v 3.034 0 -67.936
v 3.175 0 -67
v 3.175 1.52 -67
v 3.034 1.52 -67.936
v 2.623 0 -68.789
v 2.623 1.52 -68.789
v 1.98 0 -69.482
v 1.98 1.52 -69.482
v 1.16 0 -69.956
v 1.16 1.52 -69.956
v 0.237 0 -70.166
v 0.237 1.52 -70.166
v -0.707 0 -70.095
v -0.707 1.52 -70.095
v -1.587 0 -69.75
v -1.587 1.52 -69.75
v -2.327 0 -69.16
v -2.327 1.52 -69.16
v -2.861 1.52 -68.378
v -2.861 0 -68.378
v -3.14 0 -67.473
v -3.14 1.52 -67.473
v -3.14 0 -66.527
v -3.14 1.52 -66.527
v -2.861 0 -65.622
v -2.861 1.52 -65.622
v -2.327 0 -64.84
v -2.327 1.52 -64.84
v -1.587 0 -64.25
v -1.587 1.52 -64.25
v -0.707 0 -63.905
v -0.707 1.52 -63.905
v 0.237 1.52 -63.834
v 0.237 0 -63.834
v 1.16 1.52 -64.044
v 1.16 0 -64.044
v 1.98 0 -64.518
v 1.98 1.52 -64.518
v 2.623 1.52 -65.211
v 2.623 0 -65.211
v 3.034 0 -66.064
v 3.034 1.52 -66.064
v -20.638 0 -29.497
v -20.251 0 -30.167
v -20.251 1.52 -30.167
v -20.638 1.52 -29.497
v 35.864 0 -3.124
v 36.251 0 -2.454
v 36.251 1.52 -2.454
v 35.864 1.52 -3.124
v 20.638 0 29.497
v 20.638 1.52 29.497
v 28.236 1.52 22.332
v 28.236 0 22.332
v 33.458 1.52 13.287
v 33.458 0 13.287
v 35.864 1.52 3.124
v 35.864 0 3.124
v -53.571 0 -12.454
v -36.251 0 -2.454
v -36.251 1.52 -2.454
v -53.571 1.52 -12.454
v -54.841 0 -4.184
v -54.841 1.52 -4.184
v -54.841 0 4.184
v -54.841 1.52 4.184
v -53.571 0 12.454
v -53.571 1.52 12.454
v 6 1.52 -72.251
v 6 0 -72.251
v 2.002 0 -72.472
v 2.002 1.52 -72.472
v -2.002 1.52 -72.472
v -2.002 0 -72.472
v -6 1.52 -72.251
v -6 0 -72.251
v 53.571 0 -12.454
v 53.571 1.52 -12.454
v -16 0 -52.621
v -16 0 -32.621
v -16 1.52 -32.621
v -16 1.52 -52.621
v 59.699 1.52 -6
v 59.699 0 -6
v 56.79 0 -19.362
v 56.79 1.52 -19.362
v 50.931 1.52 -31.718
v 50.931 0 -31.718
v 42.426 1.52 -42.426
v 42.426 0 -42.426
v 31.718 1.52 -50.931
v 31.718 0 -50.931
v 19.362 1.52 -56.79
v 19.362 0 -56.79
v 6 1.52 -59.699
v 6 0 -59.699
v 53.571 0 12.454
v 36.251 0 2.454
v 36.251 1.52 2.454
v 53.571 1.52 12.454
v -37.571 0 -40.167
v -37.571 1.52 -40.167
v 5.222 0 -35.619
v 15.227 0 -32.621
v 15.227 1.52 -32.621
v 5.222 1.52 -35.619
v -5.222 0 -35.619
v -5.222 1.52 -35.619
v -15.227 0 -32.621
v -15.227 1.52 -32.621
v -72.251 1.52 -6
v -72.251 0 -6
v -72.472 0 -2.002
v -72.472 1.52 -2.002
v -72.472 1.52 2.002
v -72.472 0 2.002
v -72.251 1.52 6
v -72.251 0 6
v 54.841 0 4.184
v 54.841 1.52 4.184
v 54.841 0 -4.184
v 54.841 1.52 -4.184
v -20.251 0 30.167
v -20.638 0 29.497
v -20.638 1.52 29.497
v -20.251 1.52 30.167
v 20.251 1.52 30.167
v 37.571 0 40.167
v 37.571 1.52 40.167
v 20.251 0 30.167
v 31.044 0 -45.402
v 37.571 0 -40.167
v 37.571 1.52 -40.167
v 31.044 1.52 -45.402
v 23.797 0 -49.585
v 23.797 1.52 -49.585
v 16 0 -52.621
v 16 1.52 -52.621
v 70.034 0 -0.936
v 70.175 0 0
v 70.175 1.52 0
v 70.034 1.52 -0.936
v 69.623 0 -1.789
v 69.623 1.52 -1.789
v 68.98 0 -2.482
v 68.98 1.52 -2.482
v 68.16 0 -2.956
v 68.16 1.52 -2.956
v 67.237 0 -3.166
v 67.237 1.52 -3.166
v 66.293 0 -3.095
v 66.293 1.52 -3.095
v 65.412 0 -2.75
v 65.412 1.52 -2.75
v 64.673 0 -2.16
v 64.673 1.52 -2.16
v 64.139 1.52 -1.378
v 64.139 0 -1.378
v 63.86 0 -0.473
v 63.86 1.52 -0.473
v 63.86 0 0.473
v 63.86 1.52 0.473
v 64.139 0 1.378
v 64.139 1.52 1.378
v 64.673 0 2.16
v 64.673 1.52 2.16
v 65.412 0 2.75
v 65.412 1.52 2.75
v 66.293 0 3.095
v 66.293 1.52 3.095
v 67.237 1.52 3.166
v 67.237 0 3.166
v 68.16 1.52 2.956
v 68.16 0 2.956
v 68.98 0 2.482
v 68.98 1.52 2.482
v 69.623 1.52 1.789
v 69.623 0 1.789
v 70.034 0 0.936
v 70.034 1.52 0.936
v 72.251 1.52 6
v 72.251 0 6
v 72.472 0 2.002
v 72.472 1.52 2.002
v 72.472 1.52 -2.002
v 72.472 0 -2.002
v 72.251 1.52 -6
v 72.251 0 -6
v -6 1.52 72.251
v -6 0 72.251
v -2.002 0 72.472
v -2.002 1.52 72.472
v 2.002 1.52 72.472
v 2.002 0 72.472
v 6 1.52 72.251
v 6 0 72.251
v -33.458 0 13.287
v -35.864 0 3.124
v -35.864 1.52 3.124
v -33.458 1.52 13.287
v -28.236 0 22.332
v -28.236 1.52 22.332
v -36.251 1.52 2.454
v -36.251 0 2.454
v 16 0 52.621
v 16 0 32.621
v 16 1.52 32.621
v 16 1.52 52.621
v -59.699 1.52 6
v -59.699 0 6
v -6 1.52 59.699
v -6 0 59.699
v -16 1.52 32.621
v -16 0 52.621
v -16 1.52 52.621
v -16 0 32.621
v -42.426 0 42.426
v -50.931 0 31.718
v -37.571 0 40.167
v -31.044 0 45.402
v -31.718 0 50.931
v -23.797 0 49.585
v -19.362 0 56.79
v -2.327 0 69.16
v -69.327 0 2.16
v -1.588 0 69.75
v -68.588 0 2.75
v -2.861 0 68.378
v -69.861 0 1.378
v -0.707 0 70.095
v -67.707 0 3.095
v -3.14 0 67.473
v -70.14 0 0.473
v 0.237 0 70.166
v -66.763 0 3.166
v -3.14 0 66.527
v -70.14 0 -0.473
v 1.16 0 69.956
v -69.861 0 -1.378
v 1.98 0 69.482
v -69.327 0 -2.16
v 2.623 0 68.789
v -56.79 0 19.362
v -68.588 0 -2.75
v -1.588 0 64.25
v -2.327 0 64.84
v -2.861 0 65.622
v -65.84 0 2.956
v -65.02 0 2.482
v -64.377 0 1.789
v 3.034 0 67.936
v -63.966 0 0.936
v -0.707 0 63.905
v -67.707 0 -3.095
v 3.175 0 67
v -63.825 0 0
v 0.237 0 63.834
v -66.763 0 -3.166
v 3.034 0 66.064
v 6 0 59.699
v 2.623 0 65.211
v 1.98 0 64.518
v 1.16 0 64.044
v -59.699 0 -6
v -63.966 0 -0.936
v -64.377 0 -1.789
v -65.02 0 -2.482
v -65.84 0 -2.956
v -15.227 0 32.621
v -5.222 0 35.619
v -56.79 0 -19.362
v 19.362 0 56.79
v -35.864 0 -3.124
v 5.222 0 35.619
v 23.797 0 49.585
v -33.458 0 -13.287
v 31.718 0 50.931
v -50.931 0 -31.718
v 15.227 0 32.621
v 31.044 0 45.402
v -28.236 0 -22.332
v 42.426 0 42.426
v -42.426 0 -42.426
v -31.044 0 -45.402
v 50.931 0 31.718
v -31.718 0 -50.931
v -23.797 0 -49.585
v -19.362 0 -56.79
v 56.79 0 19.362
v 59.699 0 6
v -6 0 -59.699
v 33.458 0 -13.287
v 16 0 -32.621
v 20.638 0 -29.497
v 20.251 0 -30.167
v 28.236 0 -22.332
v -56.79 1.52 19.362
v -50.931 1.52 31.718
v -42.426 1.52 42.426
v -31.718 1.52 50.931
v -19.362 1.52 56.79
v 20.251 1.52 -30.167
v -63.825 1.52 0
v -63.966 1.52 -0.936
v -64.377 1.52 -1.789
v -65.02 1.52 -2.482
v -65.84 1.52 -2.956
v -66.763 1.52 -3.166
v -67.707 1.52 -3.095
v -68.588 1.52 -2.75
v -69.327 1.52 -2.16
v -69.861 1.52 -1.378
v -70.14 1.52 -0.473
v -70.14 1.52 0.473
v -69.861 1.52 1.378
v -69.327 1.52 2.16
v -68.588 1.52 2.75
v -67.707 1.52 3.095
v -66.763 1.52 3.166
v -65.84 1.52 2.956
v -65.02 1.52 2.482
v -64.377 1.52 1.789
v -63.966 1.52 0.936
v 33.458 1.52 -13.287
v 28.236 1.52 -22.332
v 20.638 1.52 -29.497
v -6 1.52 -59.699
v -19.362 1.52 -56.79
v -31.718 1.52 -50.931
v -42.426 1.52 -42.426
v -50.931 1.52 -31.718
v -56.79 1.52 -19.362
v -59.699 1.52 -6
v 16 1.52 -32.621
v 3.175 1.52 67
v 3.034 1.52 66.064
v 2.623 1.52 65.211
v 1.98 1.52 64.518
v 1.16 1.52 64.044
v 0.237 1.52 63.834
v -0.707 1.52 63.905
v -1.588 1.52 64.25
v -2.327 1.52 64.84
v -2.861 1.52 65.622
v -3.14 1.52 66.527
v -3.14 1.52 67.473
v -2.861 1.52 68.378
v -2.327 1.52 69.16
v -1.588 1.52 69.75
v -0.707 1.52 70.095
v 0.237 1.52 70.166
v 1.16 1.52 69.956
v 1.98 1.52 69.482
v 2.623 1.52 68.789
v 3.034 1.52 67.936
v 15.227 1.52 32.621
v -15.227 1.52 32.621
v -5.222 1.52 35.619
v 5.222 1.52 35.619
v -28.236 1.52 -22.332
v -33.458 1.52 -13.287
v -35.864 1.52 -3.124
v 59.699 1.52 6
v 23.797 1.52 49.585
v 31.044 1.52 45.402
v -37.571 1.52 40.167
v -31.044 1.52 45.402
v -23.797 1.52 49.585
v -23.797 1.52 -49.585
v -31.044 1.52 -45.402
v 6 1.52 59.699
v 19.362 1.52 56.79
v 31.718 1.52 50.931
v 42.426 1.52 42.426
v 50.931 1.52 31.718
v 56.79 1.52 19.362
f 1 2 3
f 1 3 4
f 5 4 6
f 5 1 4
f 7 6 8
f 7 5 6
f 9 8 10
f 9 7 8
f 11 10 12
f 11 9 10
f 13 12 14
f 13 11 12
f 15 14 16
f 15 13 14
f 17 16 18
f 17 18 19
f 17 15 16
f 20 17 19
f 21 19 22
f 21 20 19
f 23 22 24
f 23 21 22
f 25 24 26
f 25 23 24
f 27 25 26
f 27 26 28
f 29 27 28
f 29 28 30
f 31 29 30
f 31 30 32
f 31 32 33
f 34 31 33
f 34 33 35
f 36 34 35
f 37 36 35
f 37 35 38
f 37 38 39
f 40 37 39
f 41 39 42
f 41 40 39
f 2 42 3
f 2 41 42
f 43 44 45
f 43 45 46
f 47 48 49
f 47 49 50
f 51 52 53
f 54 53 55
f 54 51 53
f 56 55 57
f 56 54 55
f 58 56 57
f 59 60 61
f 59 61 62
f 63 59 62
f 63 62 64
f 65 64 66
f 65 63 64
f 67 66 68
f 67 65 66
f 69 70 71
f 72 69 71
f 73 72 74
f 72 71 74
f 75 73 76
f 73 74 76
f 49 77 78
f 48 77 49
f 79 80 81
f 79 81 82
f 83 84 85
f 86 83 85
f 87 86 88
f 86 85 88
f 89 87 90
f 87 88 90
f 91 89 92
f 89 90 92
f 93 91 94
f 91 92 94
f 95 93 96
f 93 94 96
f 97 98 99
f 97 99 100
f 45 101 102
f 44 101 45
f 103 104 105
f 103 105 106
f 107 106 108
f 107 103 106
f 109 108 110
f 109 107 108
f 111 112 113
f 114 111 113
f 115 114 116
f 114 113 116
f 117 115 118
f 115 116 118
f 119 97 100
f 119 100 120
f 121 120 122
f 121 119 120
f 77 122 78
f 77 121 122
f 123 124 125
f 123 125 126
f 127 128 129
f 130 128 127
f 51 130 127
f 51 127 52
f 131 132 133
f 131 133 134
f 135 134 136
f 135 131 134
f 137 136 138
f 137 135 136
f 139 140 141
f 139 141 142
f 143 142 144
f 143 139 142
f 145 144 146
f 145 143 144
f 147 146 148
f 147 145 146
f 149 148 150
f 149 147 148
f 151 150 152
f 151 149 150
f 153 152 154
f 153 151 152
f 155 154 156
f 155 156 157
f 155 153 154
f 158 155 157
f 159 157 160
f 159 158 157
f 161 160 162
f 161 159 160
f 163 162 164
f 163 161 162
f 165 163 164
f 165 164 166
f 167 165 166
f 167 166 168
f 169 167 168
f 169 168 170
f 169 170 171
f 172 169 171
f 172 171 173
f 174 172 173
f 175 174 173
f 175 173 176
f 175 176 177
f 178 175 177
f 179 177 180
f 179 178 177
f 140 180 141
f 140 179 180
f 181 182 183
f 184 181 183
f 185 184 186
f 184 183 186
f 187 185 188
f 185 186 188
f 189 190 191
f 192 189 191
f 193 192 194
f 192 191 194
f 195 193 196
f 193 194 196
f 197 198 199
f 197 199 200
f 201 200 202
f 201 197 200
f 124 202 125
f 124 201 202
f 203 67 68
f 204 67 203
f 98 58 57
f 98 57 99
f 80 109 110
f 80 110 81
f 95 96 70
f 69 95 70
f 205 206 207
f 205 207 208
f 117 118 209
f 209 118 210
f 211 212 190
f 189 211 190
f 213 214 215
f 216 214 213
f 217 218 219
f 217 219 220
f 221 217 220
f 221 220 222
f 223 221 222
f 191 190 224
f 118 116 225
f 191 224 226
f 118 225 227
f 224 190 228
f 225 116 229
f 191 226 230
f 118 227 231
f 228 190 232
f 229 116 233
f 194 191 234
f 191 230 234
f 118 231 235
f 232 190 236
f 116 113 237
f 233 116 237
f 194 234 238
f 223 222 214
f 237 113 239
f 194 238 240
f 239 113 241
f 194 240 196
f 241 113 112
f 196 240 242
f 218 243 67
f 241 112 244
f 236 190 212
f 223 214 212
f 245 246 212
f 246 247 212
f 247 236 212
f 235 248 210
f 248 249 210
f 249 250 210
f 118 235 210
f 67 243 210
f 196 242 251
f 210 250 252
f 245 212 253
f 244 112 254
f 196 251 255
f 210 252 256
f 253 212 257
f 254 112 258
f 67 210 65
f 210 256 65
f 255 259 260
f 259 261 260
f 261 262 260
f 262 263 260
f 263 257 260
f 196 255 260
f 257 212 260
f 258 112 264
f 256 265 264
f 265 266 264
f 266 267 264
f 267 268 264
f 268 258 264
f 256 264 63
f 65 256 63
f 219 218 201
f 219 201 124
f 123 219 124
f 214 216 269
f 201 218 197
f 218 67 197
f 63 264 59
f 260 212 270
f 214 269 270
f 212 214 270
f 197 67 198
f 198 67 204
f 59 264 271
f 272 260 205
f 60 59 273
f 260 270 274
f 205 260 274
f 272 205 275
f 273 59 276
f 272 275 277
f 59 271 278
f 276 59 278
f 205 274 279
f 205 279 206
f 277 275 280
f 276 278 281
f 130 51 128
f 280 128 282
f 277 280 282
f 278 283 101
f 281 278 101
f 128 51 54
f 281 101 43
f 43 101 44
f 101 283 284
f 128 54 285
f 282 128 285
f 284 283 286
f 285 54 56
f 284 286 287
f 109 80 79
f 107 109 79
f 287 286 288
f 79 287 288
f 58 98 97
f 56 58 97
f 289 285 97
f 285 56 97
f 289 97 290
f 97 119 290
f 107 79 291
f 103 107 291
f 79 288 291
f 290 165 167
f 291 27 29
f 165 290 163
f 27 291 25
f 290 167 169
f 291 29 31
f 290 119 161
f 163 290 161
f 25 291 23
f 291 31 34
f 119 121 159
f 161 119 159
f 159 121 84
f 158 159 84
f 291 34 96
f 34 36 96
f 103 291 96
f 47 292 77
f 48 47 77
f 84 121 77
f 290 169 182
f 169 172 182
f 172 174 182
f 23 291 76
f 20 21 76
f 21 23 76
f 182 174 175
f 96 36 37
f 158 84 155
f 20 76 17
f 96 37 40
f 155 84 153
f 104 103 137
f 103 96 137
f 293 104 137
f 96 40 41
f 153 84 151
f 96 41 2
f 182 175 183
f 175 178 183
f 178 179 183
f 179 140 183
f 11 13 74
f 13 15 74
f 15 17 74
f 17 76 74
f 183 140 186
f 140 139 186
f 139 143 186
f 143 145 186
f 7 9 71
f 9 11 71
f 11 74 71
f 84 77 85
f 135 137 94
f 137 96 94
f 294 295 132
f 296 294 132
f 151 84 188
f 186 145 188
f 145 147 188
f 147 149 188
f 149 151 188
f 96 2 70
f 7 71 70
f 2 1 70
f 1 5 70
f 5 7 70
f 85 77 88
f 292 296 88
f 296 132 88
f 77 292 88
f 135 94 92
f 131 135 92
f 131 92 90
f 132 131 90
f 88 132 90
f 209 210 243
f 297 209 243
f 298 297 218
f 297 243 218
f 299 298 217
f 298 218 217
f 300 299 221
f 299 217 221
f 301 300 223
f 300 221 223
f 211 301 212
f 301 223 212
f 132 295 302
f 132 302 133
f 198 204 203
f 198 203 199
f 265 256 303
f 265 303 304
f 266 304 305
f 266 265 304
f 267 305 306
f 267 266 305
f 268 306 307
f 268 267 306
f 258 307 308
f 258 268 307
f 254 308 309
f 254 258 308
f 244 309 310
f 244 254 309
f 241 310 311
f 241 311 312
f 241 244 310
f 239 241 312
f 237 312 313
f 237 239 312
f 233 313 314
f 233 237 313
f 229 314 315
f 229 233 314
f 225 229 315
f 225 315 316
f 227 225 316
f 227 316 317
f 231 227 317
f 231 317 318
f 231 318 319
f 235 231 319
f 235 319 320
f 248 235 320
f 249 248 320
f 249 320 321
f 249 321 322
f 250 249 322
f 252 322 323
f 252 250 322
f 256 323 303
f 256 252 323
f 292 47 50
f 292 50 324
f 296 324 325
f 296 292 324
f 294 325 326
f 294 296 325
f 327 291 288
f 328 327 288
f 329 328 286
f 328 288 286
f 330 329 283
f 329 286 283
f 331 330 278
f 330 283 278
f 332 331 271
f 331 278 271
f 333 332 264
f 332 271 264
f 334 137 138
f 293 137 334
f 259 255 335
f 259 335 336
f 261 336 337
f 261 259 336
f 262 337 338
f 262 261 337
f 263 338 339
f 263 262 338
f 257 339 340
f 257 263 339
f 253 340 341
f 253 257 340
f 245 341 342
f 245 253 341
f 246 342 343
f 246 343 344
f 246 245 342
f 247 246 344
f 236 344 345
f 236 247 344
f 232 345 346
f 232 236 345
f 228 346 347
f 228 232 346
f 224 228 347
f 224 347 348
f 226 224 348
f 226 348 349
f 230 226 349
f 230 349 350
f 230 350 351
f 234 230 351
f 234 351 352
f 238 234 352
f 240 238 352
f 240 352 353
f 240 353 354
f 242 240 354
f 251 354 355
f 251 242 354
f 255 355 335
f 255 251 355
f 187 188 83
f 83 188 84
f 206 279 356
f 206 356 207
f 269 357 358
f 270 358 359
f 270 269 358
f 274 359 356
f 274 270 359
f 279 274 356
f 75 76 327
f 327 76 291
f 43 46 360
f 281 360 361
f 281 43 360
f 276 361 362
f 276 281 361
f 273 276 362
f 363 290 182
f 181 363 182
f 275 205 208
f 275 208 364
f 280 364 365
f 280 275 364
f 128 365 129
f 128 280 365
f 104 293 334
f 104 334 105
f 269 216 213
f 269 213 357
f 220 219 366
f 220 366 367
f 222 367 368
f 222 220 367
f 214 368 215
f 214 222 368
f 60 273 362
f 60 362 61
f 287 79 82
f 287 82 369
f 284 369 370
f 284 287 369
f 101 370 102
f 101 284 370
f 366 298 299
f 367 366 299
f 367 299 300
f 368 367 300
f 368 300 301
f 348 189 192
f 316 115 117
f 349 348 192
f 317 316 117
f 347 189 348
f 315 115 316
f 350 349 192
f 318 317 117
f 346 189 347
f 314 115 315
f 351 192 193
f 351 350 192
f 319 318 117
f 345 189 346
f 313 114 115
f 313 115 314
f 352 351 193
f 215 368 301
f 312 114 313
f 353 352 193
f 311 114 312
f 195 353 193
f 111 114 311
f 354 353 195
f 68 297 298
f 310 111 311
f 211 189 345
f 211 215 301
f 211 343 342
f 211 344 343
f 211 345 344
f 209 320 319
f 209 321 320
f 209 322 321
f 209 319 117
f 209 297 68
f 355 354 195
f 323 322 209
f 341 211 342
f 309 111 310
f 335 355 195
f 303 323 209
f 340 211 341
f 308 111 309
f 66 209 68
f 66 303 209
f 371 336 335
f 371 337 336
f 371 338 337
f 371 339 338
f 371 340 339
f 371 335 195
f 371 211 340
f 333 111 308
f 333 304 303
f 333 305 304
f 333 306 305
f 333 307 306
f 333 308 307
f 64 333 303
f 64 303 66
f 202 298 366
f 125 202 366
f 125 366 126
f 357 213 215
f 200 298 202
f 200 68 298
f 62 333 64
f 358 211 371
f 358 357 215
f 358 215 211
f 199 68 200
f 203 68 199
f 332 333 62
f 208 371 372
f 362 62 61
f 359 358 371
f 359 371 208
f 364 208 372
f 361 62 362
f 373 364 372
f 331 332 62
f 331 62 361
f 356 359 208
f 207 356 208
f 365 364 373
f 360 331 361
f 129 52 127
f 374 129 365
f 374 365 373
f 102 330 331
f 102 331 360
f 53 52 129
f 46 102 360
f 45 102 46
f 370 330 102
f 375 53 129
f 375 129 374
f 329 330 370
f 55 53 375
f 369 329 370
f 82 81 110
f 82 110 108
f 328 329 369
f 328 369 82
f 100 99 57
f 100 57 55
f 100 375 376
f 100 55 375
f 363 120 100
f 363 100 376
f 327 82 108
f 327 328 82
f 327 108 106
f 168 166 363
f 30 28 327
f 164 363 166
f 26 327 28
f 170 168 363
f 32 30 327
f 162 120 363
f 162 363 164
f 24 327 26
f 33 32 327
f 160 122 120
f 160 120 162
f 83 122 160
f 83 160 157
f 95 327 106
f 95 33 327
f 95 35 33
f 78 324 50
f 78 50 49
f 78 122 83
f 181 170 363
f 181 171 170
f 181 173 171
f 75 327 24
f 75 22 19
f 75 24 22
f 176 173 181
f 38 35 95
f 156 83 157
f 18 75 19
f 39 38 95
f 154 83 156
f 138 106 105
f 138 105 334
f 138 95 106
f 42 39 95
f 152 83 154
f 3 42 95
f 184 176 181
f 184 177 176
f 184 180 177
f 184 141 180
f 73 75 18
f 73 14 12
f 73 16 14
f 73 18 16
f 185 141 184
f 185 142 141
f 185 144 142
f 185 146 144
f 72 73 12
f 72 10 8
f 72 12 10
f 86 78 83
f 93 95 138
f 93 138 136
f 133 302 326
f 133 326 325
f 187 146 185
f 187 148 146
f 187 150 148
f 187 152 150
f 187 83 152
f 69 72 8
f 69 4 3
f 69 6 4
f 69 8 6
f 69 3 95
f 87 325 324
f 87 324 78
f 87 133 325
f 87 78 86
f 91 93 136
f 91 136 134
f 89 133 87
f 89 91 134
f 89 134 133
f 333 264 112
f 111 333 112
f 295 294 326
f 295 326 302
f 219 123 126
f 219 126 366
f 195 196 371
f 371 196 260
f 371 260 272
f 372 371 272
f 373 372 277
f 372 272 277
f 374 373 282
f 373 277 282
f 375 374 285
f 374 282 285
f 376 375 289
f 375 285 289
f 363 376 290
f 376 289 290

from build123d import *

# Parameters (mm, degrees)
SKETCH1_R           = 3.175
BOSS_EXTRUDE5_DEPTH = 1.52
SKETCH3_R           = 36
CUT_EXTRUDE4_DEPTH  = 2.52


with BuildPart() as part:
    # Sketch1 → Boss-Extrude5 (new body)
    with BuildSketch(Plane(origin=(0, 0, 0), x_dir=(1, 0, 0), z_dir=(0, 1, 0))):
        with BuildLine():
            Line((-5.999999832, 72.25129758), (-5.999999832, 59.699246243))
            ThreePointArc((-5.999999832, 59.699246243), (-42.426406812, 42.426406931), (-59.699246226, 6))
            Line((-59.699246226, 6), (-72.251297552, 6.000000168))
            ThreePointArc((-72.251297552, 6.000000168), (-72.5, 1.68e-07), (-72.25129758, -5.999999832))
            Line((-72.25129758, -5.999999832), (-59.699246243, -5.999999832))
            ThreePointArc((-59.699246243, -5.999999832), (-42.426406931, -42.426406812), (-6, -59.699246226))
            Line((-6, -59.699246226), (-6.000000168, -72.251297552))
            ThreePointArc((-6.000000168, -72.251297552), (-1.68e-07, -72.5), (5.999999832, -72.25129758))
            Line((5.999999832, -72.25129758), (5.999999832, -59.699246243))
            ThreePointArc((5.999999832, -59.699246243), (42.426406812, -42.426406931), (59.699246226, -6))
            Line((59.699246226, -6), (72.251297552, -6.000000168))
            ThreePointArc((72.251297552, -6.000000168), (72.5, -1.68e-07), (72.25129758, 5.999999832))
            Line((72.25129758, 5.999999832), (59.699246243, 5.999999832))
            ThreePointArc((59.699246243, 5.999999832), (42.426406931, 42.426406812), (6, 59.699246226))
            Line((6, 59.699246226), (6.000000168, 72.251297552))
            ThreePointArc((6.000000168, 72.251297552), (1.68e-07, 72.5), (-5.999999832, 72.25129758))
        make_face()
        with Locations((9.7e-08, 67)):
            Circle(SKETCH1_R, mode=Mode.SUBTRACT)
        with Locations((67, -9.7e-08)):
            Circle(SKETCH1_R, mode=Mode.SUBTRACT)
        with Locations((-9.7e-08, -67)):
            Circle(SKETCH1_R, mode=Mode.SUBTRACT)
        with Locations((-67, 9.7e-08)):
            Circle(SKETCH1_R, mode=Mode.SUBTRACT)
        with BuildLine():
            Line((20.250864517, 30.167050694), (37.571372593, 40.167050694))
            ThreePointArc((37.571372593, 40.167050694), (27.5, 47.631397208), (16, 52.621288468))
            Line((16, 52.621288468), (16, 32.621288468))
            Line((16, 32.621288468), (-16, 32.621288468))
            Line((-16, 32.621288468), (-16, 52.621288468))
            ThreePointArc((-16, 52.621288468), (-27.5, 47.631397208), (-37.571372593, 40.167050694))
            Line((-37.571372593, 40.167050694), (-20.250864517, 30.167050694))
            Line((-20.250864517, 30.167050694), (-36.250864517, 2.454237773))
            Line((-36.250864517, 2.454237773), (-53.571372593, 12.454237773))
            ThreePointArc((-53.571372593, 12.454237773), (-55, 0), (-53.571372593, -12.454237773))
            Line((-53.571372593, -12.454237773), (-36.250864517, -2.454237773))
            Line((-36.250864517, -2.454237773), (-20.250864517, -30.167050694))
            Line((-20.250864517, -30.167050694), (-37.571372593, -40.167050694))
            ThreePointArc((-37.571372593, -40.167050694), (-27.5, -47.631397208), (-16, -52.621288468))
            Line((-16, -52.621288468), (-16, -32.621288468))
            Line((-16, -32.621288468), (16, -32.621288468))
            Line((16, -32.621288468), (16, -52.621288468))
            ThreePointArc((16, -52.621288468), (27.5, -47.631397208), (37.571372593, -40.167050694))
            Line((37.571372593, -40.167050694), (20.250864517, -30.167050694))
            Line((20.250864517, -30.167050694), (36.250864517, -2.454237773))
            Line((36.250864517, -2.454237773), (53.571372593, -12.454237773))
            ThreePointArc((53.571372593, -12.454237773), (55, 0), (53.571372593, 12.454237773))
            Line((53.571372593, 12.454237773), (36.250864517, 2.454237773))
            Line((36.250864517, 2.454237773), (20.250864517, 30.167050694))
        make_face(mode=Mode.SUBTRACT)
    extrude(amount=BOSS_EXTRUDE5_DEPTH)

    # Sketch3 → Cut-Extrude4 (cut, through all)
    with BuildSketch(Plane(origin=(0, 0, 0), x_dir=(1, 0, 0), z_dir=(0, 1, 0))):
        Circle(SKETCH3_R)
    extrude(amount=CUT_EXTRUDE4_DEPTH, mode=Mode.SUBTRACT)


solid = part.part
